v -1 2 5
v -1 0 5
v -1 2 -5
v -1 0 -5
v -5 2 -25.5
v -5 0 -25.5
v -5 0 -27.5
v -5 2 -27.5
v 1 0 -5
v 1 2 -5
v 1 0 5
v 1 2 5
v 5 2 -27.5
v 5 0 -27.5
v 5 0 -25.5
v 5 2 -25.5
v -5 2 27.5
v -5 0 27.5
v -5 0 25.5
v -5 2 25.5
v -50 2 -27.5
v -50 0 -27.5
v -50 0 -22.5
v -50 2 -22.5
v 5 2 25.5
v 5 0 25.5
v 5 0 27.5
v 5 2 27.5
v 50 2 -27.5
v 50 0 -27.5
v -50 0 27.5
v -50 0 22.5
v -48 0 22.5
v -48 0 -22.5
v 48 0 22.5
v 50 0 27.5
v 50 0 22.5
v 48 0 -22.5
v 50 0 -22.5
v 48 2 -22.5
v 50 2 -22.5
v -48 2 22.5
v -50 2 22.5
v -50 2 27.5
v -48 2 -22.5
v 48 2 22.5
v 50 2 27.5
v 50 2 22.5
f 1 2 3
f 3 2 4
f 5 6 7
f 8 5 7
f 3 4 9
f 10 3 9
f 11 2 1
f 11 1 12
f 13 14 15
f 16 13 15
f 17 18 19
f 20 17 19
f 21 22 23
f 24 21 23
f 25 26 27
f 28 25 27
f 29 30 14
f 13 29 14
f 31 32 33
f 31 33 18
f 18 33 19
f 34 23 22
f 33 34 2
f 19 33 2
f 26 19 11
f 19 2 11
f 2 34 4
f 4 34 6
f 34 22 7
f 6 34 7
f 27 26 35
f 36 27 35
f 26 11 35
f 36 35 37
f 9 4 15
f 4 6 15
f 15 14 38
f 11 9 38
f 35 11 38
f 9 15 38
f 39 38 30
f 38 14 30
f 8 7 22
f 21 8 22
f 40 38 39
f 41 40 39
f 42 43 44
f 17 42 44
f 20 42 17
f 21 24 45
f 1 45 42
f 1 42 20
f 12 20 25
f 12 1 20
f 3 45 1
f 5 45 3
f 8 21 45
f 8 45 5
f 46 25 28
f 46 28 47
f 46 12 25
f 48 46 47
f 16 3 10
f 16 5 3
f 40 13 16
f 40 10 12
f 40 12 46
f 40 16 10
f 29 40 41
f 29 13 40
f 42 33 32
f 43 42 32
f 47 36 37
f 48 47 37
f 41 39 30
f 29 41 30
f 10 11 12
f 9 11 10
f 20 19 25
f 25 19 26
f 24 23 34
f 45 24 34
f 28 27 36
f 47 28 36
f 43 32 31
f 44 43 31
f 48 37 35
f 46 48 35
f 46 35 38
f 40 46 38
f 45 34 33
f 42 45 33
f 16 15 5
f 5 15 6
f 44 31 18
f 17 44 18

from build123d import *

# Parameters (mm, degrees)
SKETCH1_W           = 2
SKETCH1_H           = 10
BOSS_EXTRUDE1_DEPTH = 2


with BuildPart() as part:
    # Sketch1 → Boss-Extrude1 (new body)
    with BuildSketch(Plane(origin=(0, 0, 0), x_dir=(1, 0, 0), z_dir=(0, 1, 0))):
        Polygon((-50, 22.5), (-48, 22.5), (-48, -22.5), (-50, -22.5), (-50, -27.5), (-5, -27.5), (-5, -25.5), (5, -25.5), (5, -27.5), (50, -27.5), (50, -22.5), (48, -22.5), (48, 22.5), (50, 22.5), (50, 27.5), (5, 27.5), (5, 25.5), (-5, 25.5), (-5, 27.5), (-50, 27.5), align=None)
        Rectangle(SKETCH1_W, SKETCH1_H, mode=Mode.SUBTRACT)
    extrude(amount=BOSS_EXTRUDE1_DEPTH)


solid = part.part
